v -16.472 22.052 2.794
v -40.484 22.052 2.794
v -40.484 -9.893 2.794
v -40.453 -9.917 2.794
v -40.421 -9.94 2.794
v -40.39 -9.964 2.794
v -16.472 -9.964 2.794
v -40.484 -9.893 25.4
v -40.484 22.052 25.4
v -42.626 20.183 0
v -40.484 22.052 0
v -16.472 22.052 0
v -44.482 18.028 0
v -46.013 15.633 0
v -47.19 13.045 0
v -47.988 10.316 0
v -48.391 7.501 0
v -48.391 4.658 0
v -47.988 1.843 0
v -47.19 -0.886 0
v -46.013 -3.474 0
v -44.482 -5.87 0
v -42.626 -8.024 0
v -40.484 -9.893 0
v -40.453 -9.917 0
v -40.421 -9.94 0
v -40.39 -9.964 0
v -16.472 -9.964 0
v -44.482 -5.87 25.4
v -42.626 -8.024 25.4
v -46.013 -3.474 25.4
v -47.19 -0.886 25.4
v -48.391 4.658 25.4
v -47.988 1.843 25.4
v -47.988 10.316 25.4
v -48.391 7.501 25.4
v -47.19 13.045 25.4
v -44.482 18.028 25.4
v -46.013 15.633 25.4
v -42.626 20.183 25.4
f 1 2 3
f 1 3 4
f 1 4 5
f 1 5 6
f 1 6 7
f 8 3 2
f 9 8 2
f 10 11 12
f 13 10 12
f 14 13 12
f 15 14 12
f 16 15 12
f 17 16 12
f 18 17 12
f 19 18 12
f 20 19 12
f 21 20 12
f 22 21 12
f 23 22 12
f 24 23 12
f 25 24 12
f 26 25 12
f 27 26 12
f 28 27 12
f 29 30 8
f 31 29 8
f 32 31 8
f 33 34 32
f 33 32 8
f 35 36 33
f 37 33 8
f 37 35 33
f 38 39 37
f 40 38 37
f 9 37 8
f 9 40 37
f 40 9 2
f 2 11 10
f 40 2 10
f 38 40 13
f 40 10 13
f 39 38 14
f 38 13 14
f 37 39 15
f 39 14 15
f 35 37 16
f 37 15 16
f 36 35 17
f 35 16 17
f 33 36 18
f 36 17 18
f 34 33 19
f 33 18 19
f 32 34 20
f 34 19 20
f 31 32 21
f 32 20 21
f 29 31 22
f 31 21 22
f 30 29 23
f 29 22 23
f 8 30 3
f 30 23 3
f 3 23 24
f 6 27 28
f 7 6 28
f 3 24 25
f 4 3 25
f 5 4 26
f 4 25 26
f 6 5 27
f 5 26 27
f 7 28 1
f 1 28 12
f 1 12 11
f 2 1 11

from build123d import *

# Parameters (mm, degrees)
F1_DEPTH = 2.794
F5_DEPTH = 25.4


# Not quite as in the source:
# - a feature of the source that left no trace in its solid (it failed there, or was rolled back) is left out
# - the program builds the solid bodies; features that only make, move or delete a surface that nothing else refers to are left out


with BuildPart() as f1:
    # F0 (on Top) → F1 (new body)
    with BuildSketch(Plane.XY):
        with BuildLine():
            Line((-16.4724217036, 22.0521983965), (-40.4838242176, 22.0521983965))
            Line((-40.4838242176, 22.0521983965), (-40.4838242176, -9.8933519139))
            ThreePointArc((-40.4838242176, -9.8933519139), (-40.4370025072, -9.928574703), (-40.3900778613, -9.963660242))
            Line((-40.3900778613, -9.963660242), (-16.4724217036, -9.963660242))
            Line((-16.4724217036, -9.963660242), (-16.4724217036, 22.0521983965))
        make_face()
    extrude(amount=F1_DEPTH)

    # F0 (on Top) → F5 (join)
    with BuildSketch(Plane.XY):
        with BuildLine():
            Line((-40.4838242176, -9.8933519139), (-40.4838242176, 22.0521983965))
            ThreePointArc((-40.4838242176, 22.0521983965), (-48.4410997737, 6.0794232413), (-40.4838242176, -9.8933519139))
        make_face()
    extrude(amount=F5_DEPTH)


solid = f1.part
